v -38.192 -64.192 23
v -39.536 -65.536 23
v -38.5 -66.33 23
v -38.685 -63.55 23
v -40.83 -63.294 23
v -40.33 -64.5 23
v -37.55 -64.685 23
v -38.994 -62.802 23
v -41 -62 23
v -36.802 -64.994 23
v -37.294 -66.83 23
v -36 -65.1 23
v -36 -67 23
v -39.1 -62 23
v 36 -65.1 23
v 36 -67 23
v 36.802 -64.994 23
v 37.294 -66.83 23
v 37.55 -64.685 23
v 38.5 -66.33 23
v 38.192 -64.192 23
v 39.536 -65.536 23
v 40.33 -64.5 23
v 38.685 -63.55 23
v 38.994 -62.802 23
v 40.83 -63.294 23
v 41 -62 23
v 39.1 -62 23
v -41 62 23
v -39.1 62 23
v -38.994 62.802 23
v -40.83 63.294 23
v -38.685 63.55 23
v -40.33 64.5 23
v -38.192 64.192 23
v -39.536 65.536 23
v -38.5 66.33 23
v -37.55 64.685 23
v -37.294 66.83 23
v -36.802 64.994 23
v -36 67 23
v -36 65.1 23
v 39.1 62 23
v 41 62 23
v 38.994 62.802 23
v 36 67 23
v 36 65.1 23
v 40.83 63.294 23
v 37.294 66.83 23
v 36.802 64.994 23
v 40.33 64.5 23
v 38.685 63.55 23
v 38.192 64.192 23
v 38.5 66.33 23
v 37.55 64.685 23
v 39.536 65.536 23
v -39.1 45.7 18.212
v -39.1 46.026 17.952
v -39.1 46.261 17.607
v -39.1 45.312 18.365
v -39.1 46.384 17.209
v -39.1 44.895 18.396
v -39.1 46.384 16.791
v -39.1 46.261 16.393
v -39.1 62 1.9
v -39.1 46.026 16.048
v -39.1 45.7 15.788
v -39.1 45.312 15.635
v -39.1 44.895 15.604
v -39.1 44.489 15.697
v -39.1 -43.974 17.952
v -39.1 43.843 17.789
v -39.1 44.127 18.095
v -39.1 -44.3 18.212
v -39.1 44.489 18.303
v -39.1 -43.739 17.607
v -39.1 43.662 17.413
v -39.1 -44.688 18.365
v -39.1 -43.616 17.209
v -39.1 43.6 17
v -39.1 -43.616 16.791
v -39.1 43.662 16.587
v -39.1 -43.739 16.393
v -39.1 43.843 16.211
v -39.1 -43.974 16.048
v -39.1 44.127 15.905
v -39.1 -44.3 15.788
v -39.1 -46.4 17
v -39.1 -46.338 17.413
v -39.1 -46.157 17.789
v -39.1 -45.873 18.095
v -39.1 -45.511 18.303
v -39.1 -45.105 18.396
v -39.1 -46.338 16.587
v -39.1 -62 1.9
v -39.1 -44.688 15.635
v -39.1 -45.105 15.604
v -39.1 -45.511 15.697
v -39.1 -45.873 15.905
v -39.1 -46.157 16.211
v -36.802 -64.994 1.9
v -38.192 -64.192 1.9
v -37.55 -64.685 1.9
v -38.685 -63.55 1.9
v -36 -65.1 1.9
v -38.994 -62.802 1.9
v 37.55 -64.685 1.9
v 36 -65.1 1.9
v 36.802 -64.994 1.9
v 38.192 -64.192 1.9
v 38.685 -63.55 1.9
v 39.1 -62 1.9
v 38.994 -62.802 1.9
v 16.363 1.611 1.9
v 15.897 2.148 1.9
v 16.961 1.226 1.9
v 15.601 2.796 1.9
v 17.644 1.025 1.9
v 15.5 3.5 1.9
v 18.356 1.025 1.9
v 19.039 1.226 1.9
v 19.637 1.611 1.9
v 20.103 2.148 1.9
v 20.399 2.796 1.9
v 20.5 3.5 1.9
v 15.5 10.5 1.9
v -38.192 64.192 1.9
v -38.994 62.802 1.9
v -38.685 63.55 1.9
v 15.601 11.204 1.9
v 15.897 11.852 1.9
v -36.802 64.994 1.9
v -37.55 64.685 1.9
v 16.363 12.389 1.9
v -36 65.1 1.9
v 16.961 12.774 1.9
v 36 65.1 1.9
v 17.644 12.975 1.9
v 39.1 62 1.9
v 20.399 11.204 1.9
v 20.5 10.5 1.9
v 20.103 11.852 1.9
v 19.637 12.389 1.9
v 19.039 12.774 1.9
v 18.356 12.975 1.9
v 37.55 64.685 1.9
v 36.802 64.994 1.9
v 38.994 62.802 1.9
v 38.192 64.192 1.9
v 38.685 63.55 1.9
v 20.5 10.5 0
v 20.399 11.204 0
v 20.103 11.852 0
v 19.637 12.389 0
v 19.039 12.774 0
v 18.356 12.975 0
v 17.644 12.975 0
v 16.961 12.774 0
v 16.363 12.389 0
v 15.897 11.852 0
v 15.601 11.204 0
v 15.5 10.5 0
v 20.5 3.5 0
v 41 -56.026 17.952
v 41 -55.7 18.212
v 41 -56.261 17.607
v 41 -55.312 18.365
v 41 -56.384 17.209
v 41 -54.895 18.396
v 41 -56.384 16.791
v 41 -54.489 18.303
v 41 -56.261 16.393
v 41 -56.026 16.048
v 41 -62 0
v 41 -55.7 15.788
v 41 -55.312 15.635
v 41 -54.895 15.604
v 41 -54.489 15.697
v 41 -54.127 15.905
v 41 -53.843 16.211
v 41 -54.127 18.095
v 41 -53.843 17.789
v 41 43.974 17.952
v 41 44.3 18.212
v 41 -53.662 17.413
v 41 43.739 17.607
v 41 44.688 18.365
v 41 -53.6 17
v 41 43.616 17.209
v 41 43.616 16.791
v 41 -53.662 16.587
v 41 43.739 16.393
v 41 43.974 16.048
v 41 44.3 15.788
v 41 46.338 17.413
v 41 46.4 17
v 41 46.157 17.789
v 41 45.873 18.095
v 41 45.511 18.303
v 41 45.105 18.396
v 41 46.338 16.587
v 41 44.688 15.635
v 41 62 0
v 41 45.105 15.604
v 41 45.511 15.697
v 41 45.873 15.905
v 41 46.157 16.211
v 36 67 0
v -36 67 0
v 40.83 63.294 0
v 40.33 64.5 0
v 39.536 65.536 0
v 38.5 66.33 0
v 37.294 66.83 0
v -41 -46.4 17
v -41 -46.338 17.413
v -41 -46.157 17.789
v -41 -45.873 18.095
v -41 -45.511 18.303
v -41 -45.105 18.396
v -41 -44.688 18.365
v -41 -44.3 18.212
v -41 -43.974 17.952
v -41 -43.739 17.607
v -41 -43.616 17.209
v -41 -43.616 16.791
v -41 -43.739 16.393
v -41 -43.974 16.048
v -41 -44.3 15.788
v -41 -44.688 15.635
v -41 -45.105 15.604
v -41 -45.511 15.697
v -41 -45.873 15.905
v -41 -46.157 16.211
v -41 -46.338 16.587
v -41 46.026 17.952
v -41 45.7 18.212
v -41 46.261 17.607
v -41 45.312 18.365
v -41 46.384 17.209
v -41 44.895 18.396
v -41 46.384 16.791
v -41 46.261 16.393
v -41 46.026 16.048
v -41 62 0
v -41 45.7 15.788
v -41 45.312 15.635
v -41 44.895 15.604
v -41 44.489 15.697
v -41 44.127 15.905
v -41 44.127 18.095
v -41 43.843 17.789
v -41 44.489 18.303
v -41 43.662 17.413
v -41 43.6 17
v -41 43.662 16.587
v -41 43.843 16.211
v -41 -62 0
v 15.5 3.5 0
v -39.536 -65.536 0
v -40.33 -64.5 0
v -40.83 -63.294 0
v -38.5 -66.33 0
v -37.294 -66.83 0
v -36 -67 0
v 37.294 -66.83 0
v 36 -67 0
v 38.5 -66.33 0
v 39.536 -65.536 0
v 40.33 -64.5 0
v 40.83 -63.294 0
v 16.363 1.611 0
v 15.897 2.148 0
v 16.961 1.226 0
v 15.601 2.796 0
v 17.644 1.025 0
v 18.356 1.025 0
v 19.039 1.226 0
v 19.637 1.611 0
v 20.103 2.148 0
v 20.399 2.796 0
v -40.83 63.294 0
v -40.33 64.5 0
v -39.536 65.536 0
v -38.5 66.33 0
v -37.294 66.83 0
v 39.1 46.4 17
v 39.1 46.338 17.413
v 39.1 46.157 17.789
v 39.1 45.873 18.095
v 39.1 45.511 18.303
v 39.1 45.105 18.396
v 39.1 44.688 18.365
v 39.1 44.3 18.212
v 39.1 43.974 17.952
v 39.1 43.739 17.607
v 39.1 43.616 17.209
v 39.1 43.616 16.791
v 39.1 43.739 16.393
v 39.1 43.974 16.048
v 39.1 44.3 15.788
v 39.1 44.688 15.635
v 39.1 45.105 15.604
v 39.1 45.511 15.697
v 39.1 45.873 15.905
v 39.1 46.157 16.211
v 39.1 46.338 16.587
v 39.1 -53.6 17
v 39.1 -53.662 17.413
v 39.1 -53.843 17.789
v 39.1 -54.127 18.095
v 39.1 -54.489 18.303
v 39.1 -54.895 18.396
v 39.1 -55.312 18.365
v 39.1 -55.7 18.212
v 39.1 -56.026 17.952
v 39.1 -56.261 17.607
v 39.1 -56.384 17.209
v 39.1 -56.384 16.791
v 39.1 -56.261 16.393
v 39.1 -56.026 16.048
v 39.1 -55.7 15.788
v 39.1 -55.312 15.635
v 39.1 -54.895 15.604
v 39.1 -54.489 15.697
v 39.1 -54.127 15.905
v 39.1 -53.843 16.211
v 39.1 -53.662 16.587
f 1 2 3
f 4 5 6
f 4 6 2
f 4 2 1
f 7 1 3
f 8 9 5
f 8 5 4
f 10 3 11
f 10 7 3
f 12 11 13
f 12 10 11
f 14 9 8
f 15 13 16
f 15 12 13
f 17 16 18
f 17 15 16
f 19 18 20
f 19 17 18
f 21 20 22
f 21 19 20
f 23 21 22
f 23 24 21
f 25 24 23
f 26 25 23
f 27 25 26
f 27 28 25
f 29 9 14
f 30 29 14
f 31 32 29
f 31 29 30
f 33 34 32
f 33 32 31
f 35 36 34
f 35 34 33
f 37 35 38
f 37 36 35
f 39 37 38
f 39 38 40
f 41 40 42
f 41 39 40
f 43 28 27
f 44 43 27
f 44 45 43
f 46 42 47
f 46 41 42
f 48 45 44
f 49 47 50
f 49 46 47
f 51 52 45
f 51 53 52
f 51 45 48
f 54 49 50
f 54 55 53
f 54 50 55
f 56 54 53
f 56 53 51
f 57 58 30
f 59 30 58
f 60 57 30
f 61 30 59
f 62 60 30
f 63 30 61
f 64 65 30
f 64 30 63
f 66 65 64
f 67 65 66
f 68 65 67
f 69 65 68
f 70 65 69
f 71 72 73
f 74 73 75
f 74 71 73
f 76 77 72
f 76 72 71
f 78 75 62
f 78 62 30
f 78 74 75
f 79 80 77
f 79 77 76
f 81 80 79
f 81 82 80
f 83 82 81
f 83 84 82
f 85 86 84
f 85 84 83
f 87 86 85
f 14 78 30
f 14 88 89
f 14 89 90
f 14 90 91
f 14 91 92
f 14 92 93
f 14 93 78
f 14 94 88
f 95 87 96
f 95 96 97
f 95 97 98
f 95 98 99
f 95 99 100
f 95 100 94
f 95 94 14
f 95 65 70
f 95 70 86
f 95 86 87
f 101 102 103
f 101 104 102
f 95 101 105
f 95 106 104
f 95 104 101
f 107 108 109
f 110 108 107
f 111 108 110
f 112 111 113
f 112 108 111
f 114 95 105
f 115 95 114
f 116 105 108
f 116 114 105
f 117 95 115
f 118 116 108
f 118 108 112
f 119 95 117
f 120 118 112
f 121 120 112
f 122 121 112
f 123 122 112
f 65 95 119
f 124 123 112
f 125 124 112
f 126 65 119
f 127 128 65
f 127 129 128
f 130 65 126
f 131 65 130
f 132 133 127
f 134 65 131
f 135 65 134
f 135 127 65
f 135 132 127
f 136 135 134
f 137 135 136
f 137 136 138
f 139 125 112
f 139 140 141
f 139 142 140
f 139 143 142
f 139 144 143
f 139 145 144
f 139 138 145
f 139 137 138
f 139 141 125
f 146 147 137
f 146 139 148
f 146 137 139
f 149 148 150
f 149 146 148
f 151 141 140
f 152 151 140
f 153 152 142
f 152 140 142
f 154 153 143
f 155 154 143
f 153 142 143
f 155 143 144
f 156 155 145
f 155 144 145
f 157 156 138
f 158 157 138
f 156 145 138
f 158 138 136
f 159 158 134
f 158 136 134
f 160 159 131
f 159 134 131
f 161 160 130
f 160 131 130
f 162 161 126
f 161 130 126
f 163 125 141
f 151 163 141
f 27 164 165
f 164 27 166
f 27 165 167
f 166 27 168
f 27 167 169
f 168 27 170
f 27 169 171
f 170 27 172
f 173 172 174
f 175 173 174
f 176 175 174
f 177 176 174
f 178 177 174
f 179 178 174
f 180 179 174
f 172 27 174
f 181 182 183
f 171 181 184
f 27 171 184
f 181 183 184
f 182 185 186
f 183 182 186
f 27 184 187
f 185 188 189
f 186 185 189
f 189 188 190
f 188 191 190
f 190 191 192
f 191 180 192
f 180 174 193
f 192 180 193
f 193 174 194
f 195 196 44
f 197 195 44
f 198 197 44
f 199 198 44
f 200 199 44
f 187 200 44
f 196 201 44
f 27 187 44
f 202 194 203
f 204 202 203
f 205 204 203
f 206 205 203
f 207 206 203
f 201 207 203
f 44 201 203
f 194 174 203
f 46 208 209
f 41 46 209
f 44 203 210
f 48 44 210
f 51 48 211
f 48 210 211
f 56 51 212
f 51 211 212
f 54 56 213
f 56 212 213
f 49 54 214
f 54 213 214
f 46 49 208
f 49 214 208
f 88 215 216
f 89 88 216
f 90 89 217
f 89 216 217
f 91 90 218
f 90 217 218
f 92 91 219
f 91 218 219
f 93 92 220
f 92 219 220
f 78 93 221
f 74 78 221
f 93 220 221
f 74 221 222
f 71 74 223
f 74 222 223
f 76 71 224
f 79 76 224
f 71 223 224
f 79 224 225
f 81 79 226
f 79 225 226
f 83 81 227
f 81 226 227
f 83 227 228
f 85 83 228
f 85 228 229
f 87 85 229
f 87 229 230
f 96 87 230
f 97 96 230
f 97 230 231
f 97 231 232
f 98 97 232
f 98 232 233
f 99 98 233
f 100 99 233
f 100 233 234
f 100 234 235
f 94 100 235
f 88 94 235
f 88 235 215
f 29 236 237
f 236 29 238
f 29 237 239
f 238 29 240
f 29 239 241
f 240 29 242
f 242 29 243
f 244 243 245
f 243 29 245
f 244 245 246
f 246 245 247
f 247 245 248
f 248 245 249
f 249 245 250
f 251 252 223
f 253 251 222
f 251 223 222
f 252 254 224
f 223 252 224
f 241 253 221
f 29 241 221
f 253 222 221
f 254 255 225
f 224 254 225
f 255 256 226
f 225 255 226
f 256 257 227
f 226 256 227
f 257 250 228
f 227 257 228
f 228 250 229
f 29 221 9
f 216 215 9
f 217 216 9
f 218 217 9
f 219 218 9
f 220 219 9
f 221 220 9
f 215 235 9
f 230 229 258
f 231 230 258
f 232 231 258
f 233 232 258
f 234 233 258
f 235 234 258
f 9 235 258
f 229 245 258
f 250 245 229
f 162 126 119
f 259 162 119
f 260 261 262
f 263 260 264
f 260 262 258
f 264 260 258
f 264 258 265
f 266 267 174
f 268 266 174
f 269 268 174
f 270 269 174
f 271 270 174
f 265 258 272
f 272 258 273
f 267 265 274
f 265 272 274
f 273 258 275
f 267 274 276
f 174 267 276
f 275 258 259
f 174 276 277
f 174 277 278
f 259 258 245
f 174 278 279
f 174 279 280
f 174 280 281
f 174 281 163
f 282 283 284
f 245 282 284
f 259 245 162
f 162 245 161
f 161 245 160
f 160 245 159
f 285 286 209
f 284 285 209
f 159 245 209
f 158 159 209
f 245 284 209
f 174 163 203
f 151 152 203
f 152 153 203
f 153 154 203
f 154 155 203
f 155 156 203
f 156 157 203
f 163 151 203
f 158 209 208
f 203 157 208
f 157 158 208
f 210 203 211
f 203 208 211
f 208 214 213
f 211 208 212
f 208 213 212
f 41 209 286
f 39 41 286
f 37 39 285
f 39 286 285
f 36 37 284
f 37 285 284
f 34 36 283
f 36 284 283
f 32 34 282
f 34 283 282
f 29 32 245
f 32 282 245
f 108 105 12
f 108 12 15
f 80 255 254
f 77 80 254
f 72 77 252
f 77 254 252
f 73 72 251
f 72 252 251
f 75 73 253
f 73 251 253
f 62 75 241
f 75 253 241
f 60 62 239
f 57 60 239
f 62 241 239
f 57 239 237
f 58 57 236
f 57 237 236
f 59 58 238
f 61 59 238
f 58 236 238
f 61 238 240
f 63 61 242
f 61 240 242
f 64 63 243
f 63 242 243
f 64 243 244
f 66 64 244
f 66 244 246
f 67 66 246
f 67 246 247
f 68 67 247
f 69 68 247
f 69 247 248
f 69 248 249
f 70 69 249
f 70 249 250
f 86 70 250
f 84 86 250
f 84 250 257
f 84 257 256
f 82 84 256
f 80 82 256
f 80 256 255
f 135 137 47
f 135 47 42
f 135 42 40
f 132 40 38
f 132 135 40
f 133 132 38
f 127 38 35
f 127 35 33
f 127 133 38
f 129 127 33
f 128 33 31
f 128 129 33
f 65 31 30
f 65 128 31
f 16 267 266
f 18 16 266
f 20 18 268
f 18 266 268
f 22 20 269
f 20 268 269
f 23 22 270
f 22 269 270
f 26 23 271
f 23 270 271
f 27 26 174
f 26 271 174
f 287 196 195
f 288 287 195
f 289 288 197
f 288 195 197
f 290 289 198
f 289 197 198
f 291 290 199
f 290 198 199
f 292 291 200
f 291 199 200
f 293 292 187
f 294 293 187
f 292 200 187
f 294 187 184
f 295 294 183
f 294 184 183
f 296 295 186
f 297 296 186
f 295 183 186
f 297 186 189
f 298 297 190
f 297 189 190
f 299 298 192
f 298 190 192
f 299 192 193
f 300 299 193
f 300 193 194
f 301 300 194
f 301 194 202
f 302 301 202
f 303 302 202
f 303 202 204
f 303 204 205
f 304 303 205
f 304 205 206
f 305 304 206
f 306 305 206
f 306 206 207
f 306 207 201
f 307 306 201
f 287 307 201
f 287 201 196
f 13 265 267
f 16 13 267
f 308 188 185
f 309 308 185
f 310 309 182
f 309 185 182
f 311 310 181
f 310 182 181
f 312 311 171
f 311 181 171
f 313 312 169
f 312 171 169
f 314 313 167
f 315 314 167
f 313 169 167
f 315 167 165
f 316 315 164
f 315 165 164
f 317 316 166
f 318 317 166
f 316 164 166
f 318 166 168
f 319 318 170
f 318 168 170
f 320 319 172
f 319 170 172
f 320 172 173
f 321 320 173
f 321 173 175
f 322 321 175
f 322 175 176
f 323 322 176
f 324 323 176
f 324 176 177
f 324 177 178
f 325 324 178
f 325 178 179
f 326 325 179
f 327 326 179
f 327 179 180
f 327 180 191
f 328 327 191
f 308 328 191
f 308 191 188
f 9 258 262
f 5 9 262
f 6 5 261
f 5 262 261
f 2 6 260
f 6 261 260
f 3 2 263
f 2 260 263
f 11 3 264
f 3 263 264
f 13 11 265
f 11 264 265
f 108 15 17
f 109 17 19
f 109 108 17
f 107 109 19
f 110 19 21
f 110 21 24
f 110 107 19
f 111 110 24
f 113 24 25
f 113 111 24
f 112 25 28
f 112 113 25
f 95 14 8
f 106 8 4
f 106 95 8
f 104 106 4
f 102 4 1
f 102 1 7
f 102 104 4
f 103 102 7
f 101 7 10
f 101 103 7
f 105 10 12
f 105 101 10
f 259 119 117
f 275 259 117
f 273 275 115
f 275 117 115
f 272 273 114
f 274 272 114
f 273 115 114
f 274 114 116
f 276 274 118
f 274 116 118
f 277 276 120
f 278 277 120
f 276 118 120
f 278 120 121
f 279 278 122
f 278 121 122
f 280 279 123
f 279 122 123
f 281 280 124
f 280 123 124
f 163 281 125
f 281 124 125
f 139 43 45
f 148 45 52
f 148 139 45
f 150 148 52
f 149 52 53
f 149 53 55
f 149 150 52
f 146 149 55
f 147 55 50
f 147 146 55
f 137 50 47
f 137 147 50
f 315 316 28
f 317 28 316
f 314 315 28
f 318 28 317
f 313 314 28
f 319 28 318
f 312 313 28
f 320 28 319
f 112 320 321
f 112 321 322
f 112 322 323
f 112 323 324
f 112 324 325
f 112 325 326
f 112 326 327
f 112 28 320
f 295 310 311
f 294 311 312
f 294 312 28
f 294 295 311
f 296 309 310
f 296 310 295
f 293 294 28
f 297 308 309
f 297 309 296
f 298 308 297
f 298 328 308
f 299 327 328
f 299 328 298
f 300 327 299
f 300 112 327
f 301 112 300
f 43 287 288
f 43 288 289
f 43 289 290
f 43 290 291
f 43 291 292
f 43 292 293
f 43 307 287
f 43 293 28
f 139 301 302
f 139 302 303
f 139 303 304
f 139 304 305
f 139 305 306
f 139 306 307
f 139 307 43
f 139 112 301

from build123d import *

# Parameters (mm, degrees)
F1_DEPTH = 23
F2_T     = -1.9
F4_DEPTH = 2
F5_R     = 1.4
F6_DEPTH = 2
F7_R     = 1.4
F8_DEPTH = 2


with BuildPart() as f1:
    # F0 (on Top) → F1 (new body)
    with BuildSketch(Plane.XY):
        with BuildLine():
            Line((-36, -67), (36, -67))
            ThreePointArc((36, -67), (39.535534, -65.535534), (41, -62))
            Line((41, -62), (41, 62))
            ThreePointArc((41, 62), (39.535534, 65.535534), (36, 67))
            Line((36, 67), (-36, 67))
            ThreePointArc((-36, 67), (-39.535534, 65.535534), (-41, 62))
            Line((-41, 62), (-41, -62))
            ThreePointArc((-41, -62), (-39.535534, -65.535534), (-36, -67))
        make_face()
    extrude(amount=F1_DEPTH)

    # F2
    f2_openings = [f1.faces().sort_by_distance(p)[0] for p in [
        (0, 0, 23),
    ]]
    offset(amount=F2_T, openings=f2_openings)

    # F3 (on face) → F4 (cut)
    with BuildSketch(Plane.XY.offset(1.9)):
        with BuildLine():
            ThreePointArc((15.5, 3.5), (18, 1), (20.5, 3.5))
            Line((20.5, 3.5), (20.5, 10.5))
            ThreePointArc((20.5, 10.5), (18, 13), (15.5, 10.5))
            Line((15.5, 10.5), (15.5, 3.5))
        make_face()
    extrude(amount=-F4_DEPTH, mode=Mode.SUBTRACT)

    # F5 (on face) → F6 (cut)
    with BuildSketch(Plane(origin=(-41, 0, 0), x_dir=(0, -1, 0), z_dir=(-1, 0, 0))):
        with Locations((-45, 17)):
            Circle(F5_R)
        with Locations((45, 17)):
            Circle(F5_R)
    extrude(amount=-F6_DEPTH, mode=Mode.SUBTRACT)

    # F7 (on face) → F8 (cut)
    with BuildSketch(Plane.YZ.offset(41)):
        with Locations((-55, 17)):
            Circle(F7_R)
        with Locations((45, 17)):
            Circle(F7_R)
    extrude(amount=-F8_DEPTH, mode=Mode.SUBTRACT)


solid = f1.part
